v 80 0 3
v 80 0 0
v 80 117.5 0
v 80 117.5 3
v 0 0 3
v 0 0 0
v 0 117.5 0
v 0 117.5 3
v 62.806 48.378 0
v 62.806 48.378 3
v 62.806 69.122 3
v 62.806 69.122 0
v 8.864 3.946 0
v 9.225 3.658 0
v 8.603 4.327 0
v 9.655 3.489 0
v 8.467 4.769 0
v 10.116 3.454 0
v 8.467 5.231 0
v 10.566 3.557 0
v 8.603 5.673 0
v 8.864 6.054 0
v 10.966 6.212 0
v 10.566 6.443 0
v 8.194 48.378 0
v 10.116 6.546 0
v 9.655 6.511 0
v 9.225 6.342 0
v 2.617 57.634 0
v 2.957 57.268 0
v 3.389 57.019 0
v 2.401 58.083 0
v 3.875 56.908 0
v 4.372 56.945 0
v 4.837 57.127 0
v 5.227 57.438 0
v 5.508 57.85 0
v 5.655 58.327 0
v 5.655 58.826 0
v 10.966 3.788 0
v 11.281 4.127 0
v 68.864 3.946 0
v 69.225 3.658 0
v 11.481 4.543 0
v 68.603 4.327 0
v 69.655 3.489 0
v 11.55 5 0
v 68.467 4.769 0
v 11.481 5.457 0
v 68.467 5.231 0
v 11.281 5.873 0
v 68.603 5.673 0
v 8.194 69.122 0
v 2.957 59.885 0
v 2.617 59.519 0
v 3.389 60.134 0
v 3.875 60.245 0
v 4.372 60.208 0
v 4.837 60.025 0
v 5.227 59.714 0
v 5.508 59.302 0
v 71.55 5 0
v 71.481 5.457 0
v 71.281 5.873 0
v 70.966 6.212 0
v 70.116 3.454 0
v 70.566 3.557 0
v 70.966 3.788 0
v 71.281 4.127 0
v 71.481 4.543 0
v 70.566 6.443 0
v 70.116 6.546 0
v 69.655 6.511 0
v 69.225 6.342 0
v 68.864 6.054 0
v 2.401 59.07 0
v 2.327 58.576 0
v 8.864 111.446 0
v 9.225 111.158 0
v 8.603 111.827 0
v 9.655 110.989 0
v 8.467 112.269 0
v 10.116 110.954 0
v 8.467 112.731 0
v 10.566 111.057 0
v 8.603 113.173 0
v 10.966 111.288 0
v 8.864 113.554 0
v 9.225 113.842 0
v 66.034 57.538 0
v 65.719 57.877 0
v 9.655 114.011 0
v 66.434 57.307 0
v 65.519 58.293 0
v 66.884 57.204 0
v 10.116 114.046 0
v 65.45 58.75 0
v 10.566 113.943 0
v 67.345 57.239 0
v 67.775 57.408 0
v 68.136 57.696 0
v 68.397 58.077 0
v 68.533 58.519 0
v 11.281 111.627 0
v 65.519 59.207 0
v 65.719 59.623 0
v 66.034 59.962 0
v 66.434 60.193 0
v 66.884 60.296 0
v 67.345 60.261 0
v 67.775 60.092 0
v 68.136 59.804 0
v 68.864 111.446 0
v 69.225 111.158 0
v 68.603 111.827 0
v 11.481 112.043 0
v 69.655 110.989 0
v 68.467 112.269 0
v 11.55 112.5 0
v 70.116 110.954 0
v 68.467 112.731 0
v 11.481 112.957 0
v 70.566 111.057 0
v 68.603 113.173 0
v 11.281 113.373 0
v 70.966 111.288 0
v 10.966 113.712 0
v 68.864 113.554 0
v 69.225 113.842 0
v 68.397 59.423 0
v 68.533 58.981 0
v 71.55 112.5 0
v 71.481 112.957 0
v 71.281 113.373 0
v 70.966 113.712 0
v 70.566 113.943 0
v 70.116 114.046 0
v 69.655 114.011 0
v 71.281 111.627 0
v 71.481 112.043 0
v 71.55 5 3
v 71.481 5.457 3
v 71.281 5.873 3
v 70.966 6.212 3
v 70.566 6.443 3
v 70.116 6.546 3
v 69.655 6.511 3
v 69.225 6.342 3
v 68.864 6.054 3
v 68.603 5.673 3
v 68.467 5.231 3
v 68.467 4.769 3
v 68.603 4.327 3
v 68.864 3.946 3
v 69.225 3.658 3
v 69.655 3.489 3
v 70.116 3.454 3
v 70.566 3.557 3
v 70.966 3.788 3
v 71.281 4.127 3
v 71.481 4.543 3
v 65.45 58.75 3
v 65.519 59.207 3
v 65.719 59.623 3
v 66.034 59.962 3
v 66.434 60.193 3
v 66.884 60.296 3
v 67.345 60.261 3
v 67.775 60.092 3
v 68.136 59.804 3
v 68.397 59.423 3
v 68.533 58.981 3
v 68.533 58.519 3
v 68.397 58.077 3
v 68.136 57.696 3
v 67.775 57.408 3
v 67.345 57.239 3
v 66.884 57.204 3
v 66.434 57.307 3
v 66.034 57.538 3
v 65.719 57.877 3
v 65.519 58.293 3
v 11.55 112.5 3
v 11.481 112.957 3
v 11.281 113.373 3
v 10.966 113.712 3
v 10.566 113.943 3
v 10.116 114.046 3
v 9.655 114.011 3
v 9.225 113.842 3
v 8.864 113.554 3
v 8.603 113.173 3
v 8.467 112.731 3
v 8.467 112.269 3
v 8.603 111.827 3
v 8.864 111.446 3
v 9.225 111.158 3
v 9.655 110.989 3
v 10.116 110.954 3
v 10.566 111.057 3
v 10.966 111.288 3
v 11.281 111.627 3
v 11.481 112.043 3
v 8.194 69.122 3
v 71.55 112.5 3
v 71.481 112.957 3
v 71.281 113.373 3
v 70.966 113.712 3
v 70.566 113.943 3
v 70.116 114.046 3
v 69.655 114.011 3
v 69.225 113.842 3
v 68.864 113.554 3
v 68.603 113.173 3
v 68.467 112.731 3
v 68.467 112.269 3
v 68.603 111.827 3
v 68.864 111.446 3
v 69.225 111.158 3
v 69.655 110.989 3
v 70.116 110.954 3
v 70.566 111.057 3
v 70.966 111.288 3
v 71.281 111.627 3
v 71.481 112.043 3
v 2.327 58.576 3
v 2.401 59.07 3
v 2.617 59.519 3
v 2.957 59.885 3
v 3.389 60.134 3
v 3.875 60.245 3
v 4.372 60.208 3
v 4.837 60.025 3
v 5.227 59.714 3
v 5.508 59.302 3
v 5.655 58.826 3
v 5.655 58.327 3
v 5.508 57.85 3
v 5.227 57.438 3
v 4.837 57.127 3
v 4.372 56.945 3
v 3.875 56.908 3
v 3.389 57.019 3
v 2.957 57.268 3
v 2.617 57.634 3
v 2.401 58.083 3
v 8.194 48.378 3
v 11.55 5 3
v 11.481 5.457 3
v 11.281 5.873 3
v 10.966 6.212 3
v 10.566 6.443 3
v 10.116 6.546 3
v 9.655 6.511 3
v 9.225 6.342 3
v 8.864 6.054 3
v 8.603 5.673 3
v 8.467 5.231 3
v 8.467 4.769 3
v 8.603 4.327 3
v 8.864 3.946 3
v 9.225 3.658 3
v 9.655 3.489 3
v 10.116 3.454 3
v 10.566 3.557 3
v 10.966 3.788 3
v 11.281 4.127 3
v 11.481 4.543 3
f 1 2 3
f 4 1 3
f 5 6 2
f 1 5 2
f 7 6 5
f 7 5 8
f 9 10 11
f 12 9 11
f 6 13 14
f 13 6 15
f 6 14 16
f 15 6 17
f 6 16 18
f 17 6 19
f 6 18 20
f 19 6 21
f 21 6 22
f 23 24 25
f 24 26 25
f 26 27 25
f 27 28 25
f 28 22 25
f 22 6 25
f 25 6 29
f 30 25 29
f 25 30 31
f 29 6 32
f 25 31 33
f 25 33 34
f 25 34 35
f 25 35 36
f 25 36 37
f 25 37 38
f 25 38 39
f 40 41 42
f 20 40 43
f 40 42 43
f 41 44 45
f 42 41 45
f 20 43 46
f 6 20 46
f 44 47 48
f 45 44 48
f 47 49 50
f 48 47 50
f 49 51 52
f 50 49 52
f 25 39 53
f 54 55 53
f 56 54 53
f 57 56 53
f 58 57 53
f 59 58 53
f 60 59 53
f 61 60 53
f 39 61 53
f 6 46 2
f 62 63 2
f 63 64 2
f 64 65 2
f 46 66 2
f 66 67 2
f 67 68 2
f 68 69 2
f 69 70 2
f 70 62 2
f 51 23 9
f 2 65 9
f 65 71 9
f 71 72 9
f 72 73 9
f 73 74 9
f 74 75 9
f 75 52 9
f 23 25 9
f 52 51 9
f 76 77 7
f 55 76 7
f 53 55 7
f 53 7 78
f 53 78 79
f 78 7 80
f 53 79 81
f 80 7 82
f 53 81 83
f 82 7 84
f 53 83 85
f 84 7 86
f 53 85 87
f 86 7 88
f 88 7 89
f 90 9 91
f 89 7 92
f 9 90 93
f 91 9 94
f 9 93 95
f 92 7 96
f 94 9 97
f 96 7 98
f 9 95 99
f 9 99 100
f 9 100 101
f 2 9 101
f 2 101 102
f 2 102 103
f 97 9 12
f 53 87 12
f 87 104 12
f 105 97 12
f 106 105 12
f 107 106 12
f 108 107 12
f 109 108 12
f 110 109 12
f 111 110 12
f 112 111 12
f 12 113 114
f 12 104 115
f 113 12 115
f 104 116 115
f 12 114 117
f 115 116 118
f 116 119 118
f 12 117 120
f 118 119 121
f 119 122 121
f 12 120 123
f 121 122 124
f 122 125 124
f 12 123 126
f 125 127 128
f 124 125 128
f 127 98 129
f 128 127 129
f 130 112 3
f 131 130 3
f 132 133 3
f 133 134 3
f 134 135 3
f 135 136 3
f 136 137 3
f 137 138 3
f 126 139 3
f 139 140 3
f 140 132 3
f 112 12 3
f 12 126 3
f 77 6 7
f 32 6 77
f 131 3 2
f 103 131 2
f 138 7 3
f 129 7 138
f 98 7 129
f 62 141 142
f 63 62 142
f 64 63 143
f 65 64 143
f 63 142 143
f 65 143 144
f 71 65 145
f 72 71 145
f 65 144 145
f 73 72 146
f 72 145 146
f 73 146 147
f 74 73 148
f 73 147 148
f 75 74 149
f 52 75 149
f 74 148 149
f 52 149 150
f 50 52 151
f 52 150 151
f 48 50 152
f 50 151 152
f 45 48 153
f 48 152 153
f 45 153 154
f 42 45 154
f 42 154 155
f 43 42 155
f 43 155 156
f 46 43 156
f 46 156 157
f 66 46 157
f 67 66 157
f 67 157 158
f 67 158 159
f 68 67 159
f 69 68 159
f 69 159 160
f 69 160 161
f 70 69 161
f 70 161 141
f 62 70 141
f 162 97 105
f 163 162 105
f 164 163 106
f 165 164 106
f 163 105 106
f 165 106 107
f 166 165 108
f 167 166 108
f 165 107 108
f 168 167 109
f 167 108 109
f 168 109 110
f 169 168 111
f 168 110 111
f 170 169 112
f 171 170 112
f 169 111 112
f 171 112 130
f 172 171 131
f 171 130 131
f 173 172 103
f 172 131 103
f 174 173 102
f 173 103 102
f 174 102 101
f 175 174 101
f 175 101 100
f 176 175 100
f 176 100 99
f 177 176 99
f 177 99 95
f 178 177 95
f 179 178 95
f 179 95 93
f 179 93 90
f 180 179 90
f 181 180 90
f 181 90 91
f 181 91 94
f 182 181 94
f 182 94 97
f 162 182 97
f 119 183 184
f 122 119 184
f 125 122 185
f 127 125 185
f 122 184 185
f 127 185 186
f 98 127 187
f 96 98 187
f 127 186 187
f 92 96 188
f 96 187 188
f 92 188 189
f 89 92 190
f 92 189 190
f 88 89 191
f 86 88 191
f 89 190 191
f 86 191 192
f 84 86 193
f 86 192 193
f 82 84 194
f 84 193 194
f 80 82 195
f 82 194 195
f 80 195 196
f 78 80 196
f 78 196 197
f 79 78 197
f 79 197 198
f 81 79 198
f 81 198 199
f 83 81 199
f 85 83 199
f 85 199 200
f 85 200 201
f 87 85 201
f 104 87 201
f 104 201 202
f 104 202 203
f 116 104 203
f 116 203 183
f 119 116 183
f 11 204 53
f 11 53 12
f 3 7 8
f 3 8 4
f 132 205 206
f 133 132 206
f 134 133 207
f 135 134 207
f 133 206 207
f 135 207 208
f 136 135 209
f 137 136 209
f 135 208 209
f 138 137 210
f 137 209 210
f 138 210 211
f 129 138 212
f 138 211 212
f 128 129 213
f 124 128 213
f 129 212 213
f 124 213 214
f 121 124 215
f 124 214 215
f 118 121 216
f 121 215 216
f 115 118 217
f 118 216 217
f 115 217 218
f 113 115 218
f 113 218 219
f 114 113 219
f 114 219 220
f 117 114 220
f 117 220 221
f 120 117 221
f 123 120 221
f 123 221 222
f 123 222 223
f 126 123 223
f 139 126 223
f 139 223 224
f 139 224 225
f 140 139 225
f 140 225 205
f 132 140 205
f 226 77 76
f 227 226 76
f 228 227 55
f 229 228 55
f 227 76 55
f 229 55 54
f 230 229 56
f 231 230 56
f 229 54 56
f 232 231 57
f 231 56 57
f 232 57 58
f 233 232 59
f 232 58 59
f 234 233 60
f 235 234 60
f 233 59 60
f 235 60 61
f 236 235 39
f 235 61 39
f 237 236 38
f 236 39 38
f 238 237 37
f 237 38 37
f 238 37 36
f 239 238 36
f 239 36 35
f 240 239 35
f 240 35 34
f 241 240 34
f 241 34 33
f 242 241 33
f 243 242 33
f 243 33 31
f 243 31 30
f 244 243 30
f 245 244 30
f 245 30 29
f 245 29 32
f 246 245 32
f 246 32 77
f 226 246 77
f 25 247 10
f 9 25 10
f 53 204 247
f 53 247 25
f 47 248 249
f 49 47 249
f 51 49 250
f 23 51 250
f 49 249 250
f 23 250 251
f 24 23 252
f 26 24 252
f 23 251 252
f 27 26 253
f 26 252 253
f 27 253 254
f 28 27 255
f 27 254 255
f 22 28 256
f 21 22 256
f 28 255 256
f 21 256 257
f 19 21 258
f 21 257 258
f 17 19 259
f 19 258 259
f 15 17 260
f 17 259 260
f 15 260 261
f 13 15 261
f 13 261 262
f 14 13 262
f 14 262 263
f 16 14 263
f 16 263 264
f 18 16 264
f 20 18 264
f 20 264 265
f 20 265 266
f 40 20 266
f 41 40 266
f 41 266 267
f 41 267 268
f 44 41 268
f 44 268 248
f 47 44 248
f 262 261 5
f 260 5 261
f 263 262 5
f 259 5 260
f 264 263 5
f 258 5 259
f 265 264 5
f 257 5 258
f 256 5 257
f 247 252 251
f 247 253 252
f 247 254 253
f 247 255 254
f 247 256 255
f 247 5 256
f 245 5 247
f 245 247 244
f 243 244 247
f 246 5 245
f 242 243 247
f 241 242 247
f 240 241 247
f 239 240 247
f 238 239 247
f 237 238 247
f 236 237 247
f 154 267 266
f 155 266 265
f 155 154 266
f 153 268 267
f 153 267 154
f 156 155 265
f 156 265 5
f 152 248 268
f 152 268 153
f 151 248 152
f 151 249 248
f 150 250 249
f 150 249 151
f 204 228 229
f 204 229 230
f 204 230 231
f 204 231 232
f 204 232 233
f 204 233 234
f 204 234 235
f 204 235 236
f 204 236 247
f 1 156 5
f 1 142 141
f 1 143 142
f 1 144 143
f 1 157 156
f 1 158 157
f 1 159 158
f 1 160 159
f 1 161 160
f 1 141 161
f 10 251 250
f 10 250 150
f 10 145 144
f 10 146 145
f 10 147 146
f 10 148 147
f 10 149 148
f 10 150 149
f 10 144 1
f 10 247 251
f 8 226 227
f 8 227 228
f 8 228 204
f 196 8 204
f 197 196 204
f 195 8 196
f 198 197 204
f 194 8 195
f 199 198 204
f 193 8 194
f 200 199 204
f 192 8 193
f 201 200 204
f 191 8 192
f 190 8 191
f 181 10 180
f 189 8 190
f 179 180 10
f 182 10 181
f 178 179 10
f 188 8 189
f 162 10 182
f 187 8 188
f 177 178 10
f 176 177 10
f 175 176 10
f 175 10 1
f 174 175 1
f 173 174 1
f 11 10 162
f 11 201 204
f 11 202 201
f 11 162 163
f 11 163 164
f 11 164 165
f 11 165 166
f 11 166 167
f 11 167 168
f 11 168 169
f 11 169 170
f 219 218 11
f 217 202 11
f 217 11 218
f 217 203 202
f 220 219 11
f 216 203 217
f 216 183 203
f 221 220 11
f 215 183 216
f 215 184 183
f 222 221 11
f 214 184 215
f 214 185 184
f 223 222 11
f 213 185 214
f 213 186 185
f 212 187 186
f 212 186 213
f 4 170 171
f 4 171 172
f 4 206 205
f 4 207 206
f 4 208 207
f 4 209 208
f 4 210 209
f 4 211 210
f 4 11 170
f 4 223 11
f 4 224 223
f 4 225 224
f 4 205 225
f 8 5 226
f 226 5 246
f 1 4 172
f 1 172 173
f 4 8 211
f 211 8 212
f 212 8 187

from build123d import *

# Parameters (mm, degrees)
SKETCH_1_W          = 80
SKETCH_1_H          = 117.5
SKETCH_1_W_2        = 35
SKETCH_1_H_2        = 15
EXTRUDE_1_DEPTH     = 3
CUT_EXTRUDE_2_REACH = 144.18
SKETCH_3_R          = 1.55
CUT_EXTRUDE_3_REACH = 144.18
SKETCH_4_R          = 1.55
SKETCH_5_R          = 1.67340685
CUT_EXTRUDE_4_DEPTH = 10
SKETCH_6_W          = 45.612722832
SKETCH_6_H          = 20.743194246
CUT_EXTRUDE_5_DEPTH = 10
SKETCH_7_W          = 3
SKETCH_7_H          = 20.743194246
CUT_EXTRUDE_6_DEPTH = 9


with BuildPart() as part:
    # 草图1 → 凸台-拉伸1 (new body)
    with BuildSketch(Plane.XY):
        with Locations((40, 58.75)):
            Rectangle(SKETCH_1_W, SKETCH_1_H)
        with Locations((40, 58.75)):
            Rectangle(SKETCH_1_W_2, SKETCH_1_H_2, mode=Mode.SUBTRACT)
    extrude(amount=EXTRUDE_1_DEPTH)

    # 草图3 → 切除-拉伸2 (cut, up to next)
    with BuildSketch(Plane.XY.offset(3), mode=Mode.PRIVATE) as cut_extrude_2_sk1:
        with Locations((10, 112.5)):
            Circle(SKETCH_3_R)
    cut_extrude_2_tool1 = extrude(cut_extrude_2_sk1.sketch, amount=-CUT_EXTRUDE_2_REACH, mode=Mode.PRIVATE) & part.part
    # 草图3 → 切除-拉伸2 (cut, up to next)
    with BuildSketch(Plane.XY.offset(3), mode=Mode.PRIVATE) as cut_extrude_2_sk2:
        with Locations((70, 112.5)):
            Circle(SKETCH_3_R)
    cut_extrude_2_tool2 = extrude(cut_extrude_2_sk2.sketch, amount=-CUT_EXTRUDE_2_REACH, mode=Mode.PRIVATE) & part.part
    # 草图3 → 切除-拉伸2 (cut, up to next)
    with BuildSketch(Plane.XY.offset(3), mode=Mode.PRIVATE) as cut_extrude_2_sk3:
        with Locations((70, 5)):
            Circle(SKETCH_3_R)
    cut_extrude_2_tool3 = extrude(cut_extrude_2_sk3.sketch, amount=-CUT_EXTRUDE_2_REACH, mode=Mode.PRIVATE) & part.part
    # 草图3 → 切除-拉伸2 (cut, up to next)
    with BuildSketch(Plane.XY.offset(3), mode=Mode.PRIVATE) as cut_extrude_2_sk4:
        with Locations((10, 5)):
            Circle(SKETCH_3_R)
    cut_extrude_2_tool4 = extrude(cut_extrude_2_sk4.sketch, amount=-CUT_EXTRUDE_2_REACH, mode=Mode.PRIVATE) & part.part
    add(cut_extrude_2_tool1.solids().sort_by_distance((10, 112.5, 3))[0], mode=Mode.SUBTRACT)
    add(cut_extrude_2_tool2.solids().sort_by_distance((70, 112.5, 3))[0], mode=Mode.SUBTRACT)
    add(cut_extrude_2_tool3.solids().sort_by_distance((70, 5, 3))[0], mode=Mode.SUBTRACT)
    add(cut_extrude_2_tool4.solids().sort_by_distance((10, 5, 3))[0], mode=Mode.SUBTRACT)

    # 草图4 → 切除-拉伸3 (cut, up to next)
    with BuildSketch(Plane(origin=(0, 0, 0), x_dir=(-1, 0, 0), z_dir=(0, 0, -1)), mode=Mode.PRIVATE) as cut_extrude_3_sk1:
        with Locations((-67, 58.75)):
            Circle(SKETCH_4_R)
    cut_extrude_3_tool1 = extrude(cut_extrude_3_sk1.sketch, amount=-CUT_EXTRUDE_3_REACH, mode=Mode.PRIVATE) & part.part
    # 草图4 → 切除-拉伸3 (cut, up to next)
    with BuildSketch(Plane(origin=(0, 0, 0), x_dir=(-1, 0, 0), z_dir=(0, 0, -1)), mode=Mode.PRIVATE) as cut_extrude_3_sk2:
        with Locations((-13, 58.75)):
            Circle(SKETCH_4_R)
    cut_extrude_3_tool2 = extrude(cut_extrude_3_sk2.sketch, amount=-CUT_EXTRUDE_3_REACH, mode=Mode.PRIVATE) & part.part
    add(cut_extrude_3_tool1.solids().sort_by_distance((67, 58.75, 0))[0], mode=Mode.SUBTRACT)
    add(cut_extrude_3_tool2.solids().sort_by_distance((13, 58.75, 0))[0], mode=Mode.SUBTRACT)

    # 草图5 → 切除-拉伸4 (cut)
    with BuildSketch(Plane(origin=(0, 0, 0), x_dir=(-1, 0, 0), z_dir=(0, 0, -1))):
        with Locations((-4, 58.576267849)):
            Circle(SKETCH_5_R)
    extrude(amount=-CUT_EXTRUDE_4_DEPTH, mode=Mode.SUBTRACT)

    # 草图6 → 切除-拉伸5 (cut)
    with BuildSketch(Plane.XY.offset(3)):
        with Locations((40, 58.75)):
            Rectangle(SKETCH_6_W, SKETCH_6_H)
    extrude(amount=-CUT_EXTRUDE_5_DEPTH, mode=Mode.SUBTRACT)

    # 草图7 → 切除-拉伸6 (cut)
    with BuildSketch(Plane(origin=(17.193638584, 0, 0), x_dir=(0, 0, -1), z_dir=(1, 0, 0))):
        with Locations((-1.5, 58.75)):
            Rectangle(SKETCH_7_W, SKETCH_7_H)
    extrude(amount=-CUT_EXTRUDE_6_DEPTH, mode=Mode.SUBTRACT)


solid = part.part
